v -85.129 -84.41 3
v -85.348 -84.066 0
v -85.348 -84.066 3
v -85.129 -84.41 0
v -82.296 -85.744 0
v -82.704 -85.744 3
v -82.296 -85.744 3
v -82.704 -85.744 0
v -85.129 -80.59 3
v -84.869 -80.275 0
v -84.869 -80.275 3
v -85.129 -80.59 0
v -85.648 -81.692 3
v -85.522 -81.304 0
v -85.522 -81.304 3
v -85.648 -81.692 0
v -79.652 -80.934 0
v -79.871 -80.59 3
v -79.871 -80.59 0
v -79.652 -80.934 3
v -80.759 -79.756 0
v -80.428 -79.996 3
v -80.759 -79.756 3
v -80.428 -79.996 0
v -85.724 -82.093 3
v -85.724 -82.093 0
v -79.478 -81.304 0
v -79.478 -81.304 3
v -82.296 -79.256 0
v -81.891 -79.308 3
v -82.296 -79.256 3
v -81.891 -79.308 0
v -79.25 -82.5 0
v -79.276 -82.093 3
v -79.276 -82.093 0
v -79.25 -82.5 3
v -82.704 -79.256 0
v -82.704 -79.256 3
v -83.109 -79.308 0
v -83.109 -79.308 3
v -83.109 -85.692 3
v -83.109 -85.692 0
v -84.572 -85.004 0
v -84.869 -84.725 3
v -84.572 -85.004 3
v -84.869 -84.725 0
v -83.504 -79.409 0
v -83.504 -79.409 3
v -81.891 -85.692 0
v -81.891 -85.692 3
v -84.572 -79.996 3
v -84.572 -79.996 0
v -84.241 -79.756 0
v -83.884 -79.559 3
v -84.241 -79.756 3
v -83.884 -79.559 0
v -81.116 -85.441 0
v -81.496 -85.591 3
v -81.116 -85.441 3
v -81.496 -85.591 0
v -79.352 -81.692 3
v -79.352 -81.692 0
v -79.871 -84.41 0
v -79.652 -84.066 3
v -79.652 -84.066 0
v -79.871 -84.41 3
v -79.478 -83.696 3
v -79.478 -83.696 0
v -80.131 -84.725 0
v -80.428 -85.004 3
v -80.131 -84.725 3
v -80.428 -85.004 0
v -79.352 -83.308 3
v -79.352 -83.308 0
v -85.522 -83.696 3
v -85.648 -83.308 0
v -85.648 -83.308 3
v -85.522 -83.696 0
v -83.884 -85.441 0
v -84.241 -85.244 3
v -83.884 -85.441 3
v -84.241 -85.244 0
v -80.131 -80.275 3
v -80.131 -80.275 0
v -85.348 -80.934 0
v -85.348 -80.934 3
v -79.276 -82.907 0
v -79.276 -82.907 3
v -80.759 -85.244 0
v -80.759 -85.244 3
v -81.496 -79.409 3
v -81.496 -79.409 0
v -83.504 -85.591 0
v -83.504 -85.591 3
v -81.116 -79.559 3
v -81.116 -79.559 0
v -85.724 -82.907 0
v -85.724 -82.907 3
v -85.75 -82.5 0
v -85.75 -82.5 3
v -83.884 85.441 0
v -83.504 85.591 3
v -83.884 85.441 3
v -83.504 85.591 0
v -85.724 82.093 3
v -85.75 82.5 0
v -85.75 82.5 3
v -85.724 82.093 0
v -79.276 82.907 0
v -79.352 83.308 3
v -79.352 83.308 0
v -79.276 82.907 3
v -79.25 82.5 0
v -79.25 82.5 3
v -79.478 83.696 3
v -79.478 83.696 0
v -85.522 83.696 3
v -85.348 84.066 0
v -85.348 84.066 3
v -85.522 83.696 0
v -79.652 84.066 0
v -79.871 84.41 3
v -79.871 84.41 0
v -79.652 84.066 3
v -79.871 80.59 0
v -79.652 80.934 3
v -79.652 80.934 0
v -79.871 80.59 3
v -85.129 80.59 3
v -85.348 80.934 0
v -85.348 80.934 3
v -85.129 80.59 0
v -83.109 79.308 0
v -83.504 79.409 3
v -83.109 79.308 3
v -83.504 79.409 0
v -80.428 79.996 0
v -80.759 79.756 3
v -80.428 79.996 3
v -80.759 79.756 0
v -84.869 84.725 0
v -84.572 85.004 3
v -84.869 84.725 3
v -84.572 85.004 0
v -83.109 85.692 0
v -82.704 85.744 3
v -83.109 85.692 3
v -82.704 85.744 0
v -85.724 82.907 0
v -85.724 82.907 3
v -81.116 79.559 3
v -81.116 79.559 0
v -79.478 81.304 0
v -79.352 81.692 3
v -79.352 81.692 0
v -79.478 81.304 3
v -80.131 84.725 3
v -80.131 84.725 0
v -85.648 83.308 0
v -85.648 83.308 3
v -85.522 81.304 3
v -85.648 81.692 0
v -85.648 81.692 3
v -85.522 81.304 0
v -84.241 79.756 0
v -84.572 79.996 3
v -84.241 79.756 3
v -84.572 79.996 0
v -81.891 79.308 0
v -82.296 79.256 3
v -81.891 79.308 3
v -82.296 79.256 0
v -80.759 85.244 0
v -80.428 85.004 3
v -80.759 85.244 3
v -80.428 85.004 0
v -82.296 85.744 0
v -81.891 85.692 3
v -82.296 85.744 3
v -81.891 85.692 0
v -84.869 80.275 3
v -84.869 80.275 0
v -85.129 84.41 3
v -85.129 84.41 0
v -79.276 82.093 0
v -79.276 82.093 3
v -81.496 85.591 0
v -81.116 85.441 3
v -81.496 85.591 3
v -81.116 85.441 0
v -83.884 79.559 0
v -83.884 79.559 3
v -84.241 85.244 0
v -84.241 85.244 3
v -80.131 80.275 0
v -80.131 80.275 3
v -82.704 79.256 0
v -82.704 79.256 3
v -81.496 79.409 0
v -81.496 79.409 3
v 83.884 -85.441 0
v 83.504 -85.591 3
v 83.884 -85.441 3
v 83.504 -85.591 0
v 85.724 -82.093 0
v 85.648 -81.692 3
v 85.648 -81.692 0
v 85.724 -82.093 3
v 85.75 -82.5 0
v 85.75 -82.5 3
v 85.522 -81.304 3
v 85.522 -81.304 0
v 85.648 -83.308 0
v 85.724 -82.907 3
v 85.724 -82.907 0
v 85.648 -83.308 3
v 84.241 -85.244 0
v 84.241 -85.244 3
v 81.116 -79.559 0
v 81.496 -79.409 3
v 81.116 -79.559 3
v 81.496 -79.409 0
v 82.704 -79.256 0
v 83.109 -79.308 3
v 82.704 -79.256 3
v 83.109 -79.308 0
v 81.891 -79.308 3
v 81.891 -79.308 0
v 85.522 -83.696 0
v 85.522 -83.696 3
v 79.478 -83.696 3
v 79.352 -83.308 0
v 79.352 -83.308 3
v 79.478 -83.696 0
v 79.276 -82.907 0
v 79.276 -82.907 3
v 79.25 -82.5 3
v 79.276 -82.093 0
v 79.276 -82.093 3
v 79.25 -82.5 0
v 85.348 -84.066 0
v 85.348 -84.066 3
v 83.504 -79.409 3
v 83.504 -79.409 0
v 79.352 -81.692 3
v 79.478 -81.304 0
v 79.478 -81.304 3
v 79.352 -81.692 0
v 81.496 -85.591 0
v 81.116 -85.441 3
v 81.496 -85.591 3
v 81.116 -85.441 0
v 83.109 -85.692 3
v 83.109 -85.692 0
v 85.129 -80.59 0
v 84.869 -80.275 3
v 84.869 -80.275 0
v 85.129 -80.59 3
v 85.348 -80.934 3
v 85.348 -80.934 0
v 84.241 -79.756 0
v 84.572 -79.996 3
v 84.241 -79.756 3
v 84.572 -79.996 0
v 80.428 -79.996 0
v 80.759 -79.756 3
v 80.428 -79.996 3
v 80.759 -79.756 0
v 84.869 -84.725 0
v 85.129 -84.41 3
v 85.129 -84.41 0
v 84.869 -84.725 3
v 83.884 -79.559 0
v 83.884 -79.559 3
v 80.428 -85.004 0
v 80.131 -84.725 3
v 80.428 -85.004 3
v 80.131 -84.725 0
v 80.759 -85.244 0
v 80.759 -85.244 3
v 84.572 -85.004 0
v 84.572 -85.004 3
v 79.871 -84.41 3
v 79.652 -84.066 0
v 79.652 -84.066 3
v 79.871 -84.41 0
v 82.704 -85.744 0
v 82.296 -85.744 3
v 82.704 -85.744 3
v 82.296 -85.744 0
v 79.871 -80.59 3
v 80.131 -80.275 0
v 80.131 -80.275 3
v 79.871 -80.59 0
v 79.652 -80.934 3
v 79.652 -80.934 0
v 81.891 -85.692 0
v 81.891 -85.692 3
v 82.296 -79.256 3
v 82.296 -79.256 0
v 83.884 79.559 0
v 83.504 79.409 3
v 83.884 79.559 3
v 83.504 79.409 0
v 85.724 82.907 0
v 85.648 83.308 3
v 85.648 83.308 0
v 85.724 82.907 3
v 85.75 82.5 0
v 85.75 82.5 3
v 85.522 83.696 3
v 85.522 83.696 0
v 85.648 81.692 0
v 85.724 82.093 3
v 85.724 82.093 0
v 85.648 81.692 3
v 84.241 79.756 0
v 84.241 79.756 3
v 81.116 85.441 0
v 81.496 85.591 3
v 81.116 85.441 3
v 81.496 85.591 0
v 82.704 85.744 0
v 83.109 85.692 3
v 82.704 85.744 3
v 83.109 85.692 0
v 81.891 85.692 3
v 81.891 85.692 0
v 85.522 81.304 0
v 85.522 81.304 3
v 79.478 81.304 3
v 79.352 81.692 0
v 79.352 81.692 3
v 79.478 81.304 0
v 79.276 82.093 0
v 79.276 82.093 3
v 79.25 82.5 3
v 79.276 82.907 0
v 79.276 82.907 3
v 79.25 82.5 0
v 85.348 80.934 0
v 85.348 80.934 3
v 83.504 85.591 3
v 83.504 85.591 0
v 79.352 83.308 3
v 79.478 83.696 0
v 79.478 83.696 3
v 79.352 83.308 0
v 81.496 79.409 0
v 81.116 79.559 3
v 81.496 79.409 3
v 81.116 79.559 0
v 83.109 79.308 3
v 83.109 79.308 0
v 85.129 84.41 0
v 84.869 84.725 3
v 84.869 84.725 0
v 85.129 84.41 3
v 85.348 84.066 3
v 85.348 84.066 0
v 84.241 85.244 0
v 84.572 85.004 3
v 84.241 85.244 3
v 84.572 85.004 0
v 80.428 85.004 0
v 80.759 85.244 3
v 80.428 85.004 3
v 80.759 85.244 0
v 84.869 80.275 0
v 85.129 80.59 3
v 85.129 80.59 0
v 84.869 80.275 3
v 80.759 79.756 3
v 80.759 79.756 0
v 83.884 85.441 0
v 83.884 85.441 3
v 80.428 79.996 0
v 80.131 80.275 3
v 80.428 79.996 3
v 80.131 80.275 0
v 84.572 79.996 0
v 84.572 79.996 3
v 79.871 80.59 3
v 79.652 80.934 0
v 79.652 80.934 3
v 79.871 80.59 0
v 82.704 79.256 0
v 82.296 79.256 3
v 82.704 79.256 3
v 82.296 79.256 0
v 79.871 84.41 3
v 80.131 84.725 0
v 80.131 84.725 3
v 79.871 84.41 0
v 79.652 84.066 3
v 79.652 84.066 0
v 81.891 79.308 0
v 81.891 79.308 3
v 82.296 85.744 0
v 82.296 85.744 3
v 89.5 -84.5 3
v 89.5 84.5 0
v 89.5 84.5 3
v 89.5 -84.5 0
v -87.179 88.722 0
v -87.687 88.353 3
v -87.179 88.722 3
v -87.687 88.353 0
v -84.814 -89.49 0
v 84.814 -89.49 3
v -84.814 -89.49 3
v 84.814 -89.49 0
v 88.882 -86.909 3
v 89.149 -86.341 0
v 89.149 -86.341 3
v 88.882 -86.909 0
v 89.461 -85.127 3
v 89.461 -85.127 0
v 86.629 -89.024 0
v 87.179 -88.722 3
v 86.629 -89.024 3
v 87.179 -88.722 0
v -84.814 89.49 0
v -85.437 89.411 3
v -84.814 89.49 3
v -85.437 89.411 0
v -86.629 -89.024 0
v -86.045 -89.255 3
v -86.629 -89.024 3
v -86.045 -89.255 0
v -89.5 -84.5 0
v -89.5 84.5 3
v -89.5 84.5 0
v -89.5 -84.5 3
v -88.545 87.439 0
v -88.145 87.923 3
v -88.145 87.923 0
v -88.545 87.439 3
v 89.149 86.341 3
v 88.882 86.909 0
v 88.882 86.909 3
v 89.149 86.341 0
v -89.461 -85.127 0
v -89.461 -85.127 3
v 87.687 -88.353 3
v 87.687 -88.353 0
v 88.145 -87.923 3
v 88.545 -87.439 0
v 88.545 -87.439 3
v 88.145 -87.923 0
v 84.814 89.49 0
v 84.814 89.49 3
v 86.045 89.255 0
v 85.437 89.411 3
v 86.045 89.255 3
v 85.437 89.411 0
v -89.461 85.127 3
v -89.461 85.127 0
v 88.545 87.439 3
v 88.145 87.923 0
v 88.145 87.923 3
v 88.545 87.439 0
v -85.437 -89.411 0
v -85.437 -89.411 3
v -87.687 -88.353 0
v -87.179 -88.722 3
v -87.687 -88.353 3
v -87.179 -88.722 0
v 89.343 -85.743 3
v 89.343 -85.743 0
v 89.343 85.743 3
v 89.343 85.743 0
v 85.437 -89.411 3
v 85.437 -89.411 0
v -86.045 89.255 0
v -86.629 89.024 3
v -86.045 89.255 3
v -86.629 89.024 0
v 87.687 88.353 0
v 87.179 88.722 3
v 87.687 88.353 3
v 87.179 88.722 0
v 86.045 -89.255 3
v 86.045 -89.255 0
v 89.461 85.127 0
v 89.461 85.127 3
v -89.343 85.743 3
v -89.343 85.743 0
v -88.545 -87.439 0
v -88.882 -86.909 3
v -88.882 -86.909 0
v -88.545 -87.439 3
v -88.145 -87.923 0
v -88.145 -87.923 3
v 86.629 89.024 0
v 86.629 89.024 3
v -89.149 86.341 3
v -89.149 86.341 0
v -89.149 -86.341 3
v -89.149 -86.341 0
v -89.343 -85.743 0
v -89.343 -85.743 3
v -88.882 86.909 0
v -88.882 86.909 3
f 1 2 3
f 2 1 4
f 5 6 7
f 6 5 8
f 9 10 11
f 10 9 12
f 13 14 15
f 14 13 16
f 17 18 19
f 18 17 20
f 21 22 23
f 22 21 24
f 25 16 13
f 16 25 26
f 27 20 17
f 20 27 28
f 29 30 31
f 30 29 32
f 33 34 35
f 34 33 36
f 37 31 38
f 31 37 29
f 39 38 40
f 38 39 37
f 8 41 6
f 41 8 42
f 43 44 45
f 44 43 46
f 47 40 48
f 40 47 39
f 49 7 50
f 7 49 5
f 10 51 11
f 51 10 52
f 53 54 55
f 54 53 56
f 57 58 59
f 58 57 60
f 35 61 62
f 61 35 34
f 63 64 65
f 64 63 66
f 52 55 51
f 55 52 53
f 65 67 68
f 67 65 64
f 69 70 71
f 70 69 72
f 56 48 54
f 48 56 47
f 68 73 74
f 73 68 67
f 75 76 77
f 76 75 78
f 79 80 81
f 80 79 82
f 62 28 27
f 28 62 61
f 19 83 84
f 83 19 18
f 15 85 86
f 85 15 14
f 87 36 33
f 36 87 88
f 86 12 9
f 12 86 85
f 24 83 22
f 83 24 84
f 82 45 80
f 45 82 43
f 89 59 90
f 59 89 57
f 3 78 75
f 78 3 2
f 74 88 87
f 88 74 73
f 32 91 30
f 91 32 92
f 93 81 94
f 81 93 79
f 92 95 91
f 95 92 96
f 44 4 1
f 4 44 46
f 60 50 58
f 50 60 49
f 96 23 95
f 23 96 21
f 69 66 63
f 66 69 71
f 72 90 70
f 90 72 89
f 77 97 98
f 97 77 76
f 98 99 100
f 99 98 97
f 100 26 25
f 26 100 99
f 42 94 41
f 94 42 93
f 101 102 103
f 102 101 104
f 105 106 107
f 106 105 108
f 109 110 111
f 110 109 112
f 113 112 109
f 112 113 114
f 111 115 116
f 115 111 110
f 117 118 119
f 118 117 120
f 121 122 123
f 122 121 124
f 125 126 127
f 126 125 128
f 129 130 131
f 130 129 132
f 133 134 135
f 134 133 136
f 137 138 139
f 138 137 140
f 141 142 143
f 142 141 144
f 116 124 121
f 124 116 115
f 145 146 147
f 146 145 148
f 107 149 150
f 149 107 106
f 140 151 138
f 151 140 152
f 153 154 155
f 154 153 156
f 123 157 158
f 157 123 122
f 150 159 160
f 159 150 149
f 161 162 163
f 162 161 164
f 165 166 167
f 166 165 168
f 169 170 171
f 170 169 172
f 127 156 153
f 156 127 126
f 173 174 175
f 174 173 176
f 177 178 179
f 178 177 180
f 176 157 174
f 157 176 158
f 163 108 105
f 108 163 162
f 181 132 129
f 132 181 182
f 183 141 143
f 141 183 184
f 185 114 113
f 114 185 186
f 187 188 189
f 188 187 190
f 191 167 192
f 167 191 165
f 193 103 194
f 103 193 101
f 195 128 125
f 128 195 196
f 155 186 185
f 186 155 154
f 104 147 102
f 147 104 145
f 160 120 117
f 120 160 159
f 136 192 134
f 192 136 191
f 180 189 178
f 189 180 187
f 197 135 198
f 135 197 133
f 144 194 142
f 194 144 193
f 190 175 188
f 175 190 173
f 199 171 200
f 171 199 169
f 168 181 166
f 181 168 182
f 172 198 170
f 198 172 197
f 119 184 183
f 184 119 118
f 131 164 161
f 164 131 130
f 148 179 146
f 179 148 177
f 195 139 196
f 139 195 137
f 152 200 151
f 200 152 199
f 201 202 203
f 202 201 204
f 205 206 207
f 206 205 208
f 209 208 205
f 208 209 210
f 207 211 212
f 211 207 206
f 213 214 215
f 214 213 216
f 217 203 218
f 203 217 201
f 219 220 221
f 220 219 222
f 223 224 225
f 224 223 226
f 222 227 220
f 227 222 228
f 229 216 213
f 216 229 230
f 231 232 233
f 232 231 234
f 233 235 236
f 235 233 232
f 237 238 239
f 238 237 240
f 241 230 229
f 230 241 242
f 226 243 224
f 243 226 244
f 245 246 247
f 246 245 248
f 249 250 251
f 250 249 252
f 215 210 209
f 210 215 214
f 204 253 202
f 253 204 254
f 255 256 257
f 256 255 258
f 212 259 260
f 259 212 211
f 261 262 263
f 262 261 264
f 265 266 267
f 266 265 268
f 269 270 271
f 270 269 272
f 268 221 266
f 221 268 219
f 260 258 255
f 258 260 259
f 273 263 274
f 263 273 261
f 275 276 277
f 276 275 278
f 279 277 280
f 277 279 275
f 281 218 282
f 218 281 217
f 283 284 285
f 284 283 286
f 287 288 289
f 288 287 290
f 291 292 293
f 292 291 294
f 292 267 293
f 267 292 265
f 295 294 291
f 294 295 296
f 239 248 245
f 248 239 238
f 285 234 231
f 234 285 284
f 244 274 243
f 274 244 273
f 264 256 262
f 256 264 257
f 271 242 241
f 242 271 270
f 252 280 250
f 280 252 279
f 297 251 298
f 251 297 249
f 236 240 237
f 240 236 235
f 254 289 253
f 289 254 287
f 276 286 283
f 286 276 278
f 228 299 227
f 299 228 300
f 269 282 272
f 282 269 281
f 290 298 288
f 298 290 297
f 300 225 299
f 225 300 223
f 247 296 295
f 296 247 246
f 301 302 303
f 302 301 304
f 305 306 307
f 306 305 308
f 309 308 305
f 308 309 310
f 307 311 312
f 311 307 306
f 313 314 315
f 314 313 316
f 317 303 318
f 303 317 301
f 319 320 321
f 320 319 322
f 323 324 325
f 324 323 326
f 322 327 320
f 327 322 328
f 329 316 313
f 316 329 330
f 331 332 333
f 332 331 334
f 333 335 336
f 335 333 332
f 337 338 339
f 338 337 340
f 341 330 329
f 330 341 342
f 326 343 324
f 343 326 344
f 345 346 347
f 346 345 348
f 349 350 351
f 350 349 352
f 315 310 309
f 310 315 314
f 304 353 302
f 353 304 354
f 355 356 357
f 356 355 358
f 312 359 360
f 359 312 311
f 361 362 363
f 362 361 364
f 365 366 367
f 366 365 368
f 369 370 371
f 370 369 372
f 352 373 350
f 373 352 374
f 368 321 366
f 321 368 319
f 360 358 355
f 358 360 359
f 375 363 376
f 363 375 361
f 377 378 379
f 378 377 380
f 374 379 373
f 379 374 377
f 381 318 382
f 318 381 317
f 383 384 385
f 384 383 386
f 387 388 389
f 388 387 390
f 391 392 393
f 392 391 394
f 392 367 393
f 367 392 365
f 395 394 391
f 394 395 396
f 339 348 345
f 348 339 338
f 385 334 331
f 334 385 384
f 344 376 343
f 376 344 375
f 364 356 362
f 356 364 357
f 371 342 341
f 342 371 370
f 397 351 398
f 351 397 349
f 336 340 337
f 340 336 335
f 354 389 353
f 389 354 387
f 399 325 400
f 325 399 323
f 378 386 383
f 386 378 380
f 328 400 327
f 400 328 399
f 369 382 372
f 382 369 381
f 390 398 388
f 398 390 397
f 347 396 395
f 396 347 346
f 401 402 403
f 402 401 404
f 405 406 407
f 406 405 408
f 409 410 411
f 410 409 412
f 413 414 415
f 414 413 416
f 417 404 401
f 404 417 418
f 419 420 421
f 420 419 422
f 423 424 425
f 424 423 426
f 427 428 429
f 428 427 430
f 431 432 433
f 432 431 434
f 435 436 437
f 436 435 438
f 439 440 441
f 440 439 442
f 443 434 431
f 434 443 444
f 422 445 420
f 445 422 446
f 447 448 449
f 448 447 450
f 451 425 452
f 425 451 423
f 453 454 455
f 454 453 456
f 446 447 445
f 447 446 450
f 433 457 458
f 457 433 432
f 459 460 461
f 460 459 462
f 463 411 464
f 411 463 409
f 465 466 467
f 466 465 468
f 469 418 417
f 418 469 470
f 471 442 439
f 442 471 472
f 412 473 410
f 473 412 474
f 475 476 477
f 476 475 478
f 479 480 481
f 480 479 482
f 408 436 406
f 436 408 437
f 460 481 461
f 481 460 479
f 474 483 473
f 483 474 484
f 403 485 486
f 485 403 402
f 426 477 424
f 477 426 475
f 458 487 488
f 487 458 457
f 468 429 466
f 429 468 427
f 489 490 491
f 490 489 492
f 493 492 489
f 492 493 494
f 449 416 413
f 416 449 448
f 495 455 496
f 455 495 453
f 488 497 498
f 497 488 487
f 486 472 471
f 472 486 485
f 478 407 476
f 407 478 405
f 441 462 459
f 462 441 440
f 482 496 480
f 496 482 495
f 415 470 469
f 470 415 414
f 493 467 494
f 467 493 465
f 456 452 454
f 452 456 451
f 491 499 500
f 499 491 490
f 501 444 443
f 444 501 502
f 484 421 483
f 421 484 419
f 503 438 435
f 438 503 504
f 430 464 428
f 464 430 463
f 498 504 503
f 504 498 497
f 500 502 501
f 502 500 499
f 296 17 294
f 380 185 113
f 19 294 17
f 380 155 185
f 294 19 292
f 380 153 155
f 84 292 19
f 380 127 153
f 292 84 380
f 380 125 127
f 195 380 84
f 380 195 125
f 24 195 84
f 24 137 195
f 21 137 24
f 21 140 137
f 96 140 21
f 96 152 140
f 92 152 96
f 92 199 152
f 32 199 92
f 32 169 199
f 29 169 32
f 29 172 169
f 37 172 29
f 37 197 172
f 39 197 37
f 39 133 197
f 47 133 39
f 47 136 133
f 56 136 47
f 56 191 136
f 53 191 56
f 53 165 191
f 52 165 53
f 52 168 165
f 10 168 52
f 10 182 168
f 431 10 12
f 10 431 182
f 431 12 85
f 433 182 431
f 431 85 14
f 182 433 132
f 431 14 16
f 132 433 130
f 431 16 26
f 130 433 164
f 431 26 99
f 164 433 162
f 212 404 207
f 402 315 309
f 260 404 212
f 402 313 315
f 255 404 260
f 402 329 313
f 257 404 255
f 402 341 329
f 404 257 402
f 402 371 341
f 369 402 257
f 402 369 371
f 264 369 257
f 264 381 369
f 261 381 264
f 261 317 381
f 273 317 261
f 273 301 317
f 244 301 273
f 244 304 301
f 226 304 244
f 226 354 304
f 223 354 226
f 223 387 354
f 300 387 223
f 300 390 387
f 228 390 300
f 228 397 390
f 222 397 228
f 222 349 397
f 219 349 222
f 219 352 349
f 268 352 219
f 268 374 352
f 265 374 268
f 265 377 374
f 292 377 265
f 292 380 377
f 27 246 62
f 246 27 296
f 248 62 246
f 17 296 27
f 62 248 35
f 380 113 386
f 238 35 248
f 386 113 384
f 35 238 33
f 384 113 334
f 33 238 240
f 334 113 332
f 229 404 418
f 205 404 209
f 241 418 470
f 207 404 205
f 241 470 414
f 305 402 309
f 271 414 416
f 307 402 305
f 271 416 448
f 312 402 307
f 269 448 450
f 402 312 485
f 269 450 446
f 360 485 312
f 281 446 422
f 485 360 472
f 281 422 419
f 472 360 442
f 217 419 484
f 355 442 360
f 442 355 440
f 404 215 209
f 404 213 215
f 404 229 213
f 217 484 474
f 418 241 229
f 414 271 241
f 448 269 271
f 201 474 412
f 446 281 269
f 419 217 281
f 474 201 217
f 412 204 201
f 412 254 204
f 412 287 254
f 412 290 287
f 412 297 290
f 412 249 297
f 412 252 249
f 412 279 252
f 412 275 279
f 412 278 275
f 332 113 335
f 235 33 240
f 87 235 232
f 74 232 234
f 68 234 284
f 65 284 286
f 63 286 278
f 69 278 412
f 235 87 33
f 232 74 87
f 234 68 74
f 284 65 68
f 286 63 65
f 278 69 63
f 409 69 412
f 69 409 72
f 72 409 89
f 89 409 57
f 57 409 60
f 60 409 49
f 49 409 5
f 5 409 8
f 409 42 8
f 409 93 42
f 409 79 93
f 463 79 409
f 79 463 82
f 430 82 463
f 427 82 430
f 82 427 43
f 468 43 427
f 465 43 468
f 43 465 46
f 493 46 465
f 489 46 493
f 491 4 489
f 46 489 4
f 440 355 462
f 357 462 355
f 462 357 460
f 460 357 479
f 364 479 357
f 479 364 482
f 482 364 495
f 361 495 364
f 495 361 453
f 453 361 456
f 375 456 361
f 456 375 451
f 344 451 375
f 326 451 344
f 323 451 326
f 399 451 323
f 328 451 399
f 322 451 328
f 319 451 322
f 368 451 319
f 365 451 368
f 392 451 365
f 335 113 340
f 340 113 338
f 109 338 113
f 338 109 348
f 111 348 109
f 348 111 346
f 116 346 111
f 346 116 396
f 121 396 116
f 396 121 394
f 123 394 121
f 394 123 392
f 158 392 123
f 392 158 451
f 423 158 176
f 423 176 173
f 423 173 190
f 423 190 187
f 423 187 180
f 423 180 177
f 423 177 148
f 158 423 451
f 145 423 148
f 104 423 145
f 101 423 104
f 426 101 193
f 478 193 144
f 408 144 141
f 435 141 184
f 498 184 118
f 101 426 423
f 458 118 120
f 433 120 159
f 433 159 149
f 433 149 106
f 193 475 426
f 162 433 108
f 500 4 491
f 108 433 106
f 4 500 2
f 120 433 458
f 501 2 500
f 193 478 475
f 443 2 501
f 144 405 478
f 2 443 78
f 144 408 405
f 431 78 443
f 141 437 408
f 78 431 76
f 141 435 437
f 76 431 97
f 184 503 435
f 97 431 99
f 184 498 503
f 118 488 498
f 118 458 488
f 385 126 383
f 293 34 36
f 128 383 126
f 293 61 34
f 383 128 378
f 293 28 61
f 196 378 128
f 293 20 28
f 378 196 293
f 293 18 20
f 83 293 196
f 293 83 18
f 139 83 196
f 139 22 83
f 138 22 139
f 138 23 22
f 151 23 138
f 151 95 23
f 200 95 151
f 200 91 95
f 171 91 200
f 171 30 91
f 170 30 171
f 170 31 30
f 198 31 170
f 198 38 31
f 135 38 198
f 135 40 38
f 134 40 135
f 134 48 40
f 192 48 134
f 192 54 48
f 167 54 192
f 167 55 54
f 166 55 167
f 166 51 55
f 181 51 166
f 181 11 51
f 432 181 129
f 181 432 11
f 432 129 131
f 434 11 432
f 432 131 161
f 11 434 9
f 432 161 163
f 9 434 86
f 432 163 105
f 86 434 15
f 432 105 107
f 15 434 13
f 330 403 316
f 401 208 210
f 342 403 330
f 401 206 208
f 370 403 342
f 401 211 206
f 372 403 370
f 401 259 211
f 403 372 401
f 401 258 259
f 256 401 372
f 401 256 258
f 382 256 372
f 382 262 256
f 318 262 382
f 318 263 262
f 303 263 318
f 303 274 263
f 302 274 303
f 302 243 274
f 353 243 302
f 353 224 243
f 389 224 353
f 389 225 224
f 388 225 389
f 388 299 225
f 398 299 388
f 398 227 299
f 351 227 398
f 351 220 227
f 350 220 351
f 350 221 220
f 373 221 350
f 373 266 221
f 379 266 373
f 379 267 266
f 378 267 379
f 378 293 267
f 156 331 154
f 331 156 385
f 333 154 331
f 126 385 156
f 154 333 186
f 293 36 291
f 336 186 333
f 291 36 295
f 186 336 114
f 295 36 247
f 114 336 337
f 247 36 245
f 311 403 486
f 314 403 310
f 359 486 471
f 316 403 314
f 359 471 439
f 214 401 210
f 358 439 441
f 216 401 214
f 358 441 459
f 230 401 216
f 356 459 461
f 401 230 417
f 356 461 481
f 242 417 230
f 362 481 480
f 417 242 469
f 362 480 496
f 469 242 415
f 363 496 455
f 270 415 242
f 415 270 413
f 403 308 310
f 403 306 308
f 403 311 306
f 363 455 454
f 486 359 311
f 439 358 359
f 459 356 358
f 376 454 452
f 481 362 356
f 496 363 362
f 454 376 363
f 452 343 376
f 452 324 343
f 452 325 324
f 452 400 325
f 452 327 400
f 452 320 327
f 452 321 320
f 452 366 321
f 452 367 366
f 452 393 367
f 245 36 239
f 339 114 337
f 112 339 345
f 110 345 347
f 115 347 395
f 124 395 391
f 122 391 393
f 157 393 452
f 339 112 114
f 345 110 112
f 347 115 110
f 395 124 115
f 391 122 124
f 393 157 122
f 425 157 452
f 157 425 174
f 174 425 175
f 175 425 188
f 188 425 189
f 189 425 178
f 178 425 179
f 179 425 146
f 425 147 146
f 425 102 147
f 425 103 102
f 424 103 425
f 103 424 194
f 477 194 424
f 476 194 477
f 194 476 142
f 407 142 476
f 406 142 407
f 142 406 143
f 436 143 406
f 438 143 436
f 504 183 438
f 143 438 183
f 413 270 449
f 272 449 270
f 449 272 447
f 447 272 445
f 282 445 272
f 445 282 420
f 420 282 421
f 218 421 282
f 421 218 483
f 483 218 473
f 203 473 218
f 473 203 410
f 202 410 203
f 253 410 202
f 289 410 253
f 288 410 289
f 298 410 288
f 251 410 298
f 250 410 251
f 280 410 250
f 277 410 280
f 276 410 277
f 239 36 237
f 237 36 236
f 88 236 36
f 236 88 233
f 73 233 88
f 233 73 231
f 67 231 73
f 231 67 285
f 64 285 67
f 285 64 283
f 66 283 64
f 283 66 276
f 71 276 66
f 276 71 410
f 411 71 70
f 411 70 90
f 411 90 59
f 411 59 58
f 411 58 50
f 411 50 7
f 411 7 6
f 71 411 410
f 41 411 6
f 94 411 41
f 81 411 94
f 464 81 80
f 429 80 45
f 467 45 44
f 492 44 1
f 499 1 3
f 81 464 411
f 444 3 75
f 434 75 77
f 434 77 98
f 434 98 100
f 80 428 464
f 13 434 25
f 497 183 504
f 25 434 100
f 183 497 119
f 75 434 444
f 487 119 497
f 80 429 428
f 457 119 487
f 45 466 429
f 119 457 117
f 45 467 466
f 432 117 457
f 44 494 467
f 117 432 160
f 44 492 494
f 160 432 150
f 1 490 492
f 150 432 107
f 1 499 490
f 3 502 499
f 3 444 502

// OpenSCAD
$fn = 50;


difference() {
	union() {
		hull() {
			translate(v = [-84.5000000000, 84.5000000000, 0]) {
				cylinder(h = 3, r = 5);
			}
			translate(v = [84.5000000000, 84.5000000000, 0]) {
				cylinder(h = 3, r = 5);
			}
			translate(v = [-84.5000000000, -84.5000000000, 0]) {
				cylinder(h = 3, r = 5);
			}
			translate(v = [84.5000000000, -84.5000000000, 0]) {
				cylinder(h = 3, r = 5);
			}
		}
	}
	union() {
		translate(v = [-82.5000000000, -82.5000000000, -100.0000000000]) {
			cylinder(h = 200, r = 3.2500000000);
		}
		translate(v = [-82.5000000000, 82.5000000000, -100.0000000000]) {
			cylinder(h = 200, r = 3.2500000000);
		}
		translate(v = [82.5000000000, -82.5000000000, -100.0000000000]) {
			cylinder(h = 200, r = 3.2500000000);
		}
		translate(v = [82.5000000000, 82.5000000000, -100.0000000000]) {
			cylinder(h = 200, r = 3.2500000000);
		}
	}
}
